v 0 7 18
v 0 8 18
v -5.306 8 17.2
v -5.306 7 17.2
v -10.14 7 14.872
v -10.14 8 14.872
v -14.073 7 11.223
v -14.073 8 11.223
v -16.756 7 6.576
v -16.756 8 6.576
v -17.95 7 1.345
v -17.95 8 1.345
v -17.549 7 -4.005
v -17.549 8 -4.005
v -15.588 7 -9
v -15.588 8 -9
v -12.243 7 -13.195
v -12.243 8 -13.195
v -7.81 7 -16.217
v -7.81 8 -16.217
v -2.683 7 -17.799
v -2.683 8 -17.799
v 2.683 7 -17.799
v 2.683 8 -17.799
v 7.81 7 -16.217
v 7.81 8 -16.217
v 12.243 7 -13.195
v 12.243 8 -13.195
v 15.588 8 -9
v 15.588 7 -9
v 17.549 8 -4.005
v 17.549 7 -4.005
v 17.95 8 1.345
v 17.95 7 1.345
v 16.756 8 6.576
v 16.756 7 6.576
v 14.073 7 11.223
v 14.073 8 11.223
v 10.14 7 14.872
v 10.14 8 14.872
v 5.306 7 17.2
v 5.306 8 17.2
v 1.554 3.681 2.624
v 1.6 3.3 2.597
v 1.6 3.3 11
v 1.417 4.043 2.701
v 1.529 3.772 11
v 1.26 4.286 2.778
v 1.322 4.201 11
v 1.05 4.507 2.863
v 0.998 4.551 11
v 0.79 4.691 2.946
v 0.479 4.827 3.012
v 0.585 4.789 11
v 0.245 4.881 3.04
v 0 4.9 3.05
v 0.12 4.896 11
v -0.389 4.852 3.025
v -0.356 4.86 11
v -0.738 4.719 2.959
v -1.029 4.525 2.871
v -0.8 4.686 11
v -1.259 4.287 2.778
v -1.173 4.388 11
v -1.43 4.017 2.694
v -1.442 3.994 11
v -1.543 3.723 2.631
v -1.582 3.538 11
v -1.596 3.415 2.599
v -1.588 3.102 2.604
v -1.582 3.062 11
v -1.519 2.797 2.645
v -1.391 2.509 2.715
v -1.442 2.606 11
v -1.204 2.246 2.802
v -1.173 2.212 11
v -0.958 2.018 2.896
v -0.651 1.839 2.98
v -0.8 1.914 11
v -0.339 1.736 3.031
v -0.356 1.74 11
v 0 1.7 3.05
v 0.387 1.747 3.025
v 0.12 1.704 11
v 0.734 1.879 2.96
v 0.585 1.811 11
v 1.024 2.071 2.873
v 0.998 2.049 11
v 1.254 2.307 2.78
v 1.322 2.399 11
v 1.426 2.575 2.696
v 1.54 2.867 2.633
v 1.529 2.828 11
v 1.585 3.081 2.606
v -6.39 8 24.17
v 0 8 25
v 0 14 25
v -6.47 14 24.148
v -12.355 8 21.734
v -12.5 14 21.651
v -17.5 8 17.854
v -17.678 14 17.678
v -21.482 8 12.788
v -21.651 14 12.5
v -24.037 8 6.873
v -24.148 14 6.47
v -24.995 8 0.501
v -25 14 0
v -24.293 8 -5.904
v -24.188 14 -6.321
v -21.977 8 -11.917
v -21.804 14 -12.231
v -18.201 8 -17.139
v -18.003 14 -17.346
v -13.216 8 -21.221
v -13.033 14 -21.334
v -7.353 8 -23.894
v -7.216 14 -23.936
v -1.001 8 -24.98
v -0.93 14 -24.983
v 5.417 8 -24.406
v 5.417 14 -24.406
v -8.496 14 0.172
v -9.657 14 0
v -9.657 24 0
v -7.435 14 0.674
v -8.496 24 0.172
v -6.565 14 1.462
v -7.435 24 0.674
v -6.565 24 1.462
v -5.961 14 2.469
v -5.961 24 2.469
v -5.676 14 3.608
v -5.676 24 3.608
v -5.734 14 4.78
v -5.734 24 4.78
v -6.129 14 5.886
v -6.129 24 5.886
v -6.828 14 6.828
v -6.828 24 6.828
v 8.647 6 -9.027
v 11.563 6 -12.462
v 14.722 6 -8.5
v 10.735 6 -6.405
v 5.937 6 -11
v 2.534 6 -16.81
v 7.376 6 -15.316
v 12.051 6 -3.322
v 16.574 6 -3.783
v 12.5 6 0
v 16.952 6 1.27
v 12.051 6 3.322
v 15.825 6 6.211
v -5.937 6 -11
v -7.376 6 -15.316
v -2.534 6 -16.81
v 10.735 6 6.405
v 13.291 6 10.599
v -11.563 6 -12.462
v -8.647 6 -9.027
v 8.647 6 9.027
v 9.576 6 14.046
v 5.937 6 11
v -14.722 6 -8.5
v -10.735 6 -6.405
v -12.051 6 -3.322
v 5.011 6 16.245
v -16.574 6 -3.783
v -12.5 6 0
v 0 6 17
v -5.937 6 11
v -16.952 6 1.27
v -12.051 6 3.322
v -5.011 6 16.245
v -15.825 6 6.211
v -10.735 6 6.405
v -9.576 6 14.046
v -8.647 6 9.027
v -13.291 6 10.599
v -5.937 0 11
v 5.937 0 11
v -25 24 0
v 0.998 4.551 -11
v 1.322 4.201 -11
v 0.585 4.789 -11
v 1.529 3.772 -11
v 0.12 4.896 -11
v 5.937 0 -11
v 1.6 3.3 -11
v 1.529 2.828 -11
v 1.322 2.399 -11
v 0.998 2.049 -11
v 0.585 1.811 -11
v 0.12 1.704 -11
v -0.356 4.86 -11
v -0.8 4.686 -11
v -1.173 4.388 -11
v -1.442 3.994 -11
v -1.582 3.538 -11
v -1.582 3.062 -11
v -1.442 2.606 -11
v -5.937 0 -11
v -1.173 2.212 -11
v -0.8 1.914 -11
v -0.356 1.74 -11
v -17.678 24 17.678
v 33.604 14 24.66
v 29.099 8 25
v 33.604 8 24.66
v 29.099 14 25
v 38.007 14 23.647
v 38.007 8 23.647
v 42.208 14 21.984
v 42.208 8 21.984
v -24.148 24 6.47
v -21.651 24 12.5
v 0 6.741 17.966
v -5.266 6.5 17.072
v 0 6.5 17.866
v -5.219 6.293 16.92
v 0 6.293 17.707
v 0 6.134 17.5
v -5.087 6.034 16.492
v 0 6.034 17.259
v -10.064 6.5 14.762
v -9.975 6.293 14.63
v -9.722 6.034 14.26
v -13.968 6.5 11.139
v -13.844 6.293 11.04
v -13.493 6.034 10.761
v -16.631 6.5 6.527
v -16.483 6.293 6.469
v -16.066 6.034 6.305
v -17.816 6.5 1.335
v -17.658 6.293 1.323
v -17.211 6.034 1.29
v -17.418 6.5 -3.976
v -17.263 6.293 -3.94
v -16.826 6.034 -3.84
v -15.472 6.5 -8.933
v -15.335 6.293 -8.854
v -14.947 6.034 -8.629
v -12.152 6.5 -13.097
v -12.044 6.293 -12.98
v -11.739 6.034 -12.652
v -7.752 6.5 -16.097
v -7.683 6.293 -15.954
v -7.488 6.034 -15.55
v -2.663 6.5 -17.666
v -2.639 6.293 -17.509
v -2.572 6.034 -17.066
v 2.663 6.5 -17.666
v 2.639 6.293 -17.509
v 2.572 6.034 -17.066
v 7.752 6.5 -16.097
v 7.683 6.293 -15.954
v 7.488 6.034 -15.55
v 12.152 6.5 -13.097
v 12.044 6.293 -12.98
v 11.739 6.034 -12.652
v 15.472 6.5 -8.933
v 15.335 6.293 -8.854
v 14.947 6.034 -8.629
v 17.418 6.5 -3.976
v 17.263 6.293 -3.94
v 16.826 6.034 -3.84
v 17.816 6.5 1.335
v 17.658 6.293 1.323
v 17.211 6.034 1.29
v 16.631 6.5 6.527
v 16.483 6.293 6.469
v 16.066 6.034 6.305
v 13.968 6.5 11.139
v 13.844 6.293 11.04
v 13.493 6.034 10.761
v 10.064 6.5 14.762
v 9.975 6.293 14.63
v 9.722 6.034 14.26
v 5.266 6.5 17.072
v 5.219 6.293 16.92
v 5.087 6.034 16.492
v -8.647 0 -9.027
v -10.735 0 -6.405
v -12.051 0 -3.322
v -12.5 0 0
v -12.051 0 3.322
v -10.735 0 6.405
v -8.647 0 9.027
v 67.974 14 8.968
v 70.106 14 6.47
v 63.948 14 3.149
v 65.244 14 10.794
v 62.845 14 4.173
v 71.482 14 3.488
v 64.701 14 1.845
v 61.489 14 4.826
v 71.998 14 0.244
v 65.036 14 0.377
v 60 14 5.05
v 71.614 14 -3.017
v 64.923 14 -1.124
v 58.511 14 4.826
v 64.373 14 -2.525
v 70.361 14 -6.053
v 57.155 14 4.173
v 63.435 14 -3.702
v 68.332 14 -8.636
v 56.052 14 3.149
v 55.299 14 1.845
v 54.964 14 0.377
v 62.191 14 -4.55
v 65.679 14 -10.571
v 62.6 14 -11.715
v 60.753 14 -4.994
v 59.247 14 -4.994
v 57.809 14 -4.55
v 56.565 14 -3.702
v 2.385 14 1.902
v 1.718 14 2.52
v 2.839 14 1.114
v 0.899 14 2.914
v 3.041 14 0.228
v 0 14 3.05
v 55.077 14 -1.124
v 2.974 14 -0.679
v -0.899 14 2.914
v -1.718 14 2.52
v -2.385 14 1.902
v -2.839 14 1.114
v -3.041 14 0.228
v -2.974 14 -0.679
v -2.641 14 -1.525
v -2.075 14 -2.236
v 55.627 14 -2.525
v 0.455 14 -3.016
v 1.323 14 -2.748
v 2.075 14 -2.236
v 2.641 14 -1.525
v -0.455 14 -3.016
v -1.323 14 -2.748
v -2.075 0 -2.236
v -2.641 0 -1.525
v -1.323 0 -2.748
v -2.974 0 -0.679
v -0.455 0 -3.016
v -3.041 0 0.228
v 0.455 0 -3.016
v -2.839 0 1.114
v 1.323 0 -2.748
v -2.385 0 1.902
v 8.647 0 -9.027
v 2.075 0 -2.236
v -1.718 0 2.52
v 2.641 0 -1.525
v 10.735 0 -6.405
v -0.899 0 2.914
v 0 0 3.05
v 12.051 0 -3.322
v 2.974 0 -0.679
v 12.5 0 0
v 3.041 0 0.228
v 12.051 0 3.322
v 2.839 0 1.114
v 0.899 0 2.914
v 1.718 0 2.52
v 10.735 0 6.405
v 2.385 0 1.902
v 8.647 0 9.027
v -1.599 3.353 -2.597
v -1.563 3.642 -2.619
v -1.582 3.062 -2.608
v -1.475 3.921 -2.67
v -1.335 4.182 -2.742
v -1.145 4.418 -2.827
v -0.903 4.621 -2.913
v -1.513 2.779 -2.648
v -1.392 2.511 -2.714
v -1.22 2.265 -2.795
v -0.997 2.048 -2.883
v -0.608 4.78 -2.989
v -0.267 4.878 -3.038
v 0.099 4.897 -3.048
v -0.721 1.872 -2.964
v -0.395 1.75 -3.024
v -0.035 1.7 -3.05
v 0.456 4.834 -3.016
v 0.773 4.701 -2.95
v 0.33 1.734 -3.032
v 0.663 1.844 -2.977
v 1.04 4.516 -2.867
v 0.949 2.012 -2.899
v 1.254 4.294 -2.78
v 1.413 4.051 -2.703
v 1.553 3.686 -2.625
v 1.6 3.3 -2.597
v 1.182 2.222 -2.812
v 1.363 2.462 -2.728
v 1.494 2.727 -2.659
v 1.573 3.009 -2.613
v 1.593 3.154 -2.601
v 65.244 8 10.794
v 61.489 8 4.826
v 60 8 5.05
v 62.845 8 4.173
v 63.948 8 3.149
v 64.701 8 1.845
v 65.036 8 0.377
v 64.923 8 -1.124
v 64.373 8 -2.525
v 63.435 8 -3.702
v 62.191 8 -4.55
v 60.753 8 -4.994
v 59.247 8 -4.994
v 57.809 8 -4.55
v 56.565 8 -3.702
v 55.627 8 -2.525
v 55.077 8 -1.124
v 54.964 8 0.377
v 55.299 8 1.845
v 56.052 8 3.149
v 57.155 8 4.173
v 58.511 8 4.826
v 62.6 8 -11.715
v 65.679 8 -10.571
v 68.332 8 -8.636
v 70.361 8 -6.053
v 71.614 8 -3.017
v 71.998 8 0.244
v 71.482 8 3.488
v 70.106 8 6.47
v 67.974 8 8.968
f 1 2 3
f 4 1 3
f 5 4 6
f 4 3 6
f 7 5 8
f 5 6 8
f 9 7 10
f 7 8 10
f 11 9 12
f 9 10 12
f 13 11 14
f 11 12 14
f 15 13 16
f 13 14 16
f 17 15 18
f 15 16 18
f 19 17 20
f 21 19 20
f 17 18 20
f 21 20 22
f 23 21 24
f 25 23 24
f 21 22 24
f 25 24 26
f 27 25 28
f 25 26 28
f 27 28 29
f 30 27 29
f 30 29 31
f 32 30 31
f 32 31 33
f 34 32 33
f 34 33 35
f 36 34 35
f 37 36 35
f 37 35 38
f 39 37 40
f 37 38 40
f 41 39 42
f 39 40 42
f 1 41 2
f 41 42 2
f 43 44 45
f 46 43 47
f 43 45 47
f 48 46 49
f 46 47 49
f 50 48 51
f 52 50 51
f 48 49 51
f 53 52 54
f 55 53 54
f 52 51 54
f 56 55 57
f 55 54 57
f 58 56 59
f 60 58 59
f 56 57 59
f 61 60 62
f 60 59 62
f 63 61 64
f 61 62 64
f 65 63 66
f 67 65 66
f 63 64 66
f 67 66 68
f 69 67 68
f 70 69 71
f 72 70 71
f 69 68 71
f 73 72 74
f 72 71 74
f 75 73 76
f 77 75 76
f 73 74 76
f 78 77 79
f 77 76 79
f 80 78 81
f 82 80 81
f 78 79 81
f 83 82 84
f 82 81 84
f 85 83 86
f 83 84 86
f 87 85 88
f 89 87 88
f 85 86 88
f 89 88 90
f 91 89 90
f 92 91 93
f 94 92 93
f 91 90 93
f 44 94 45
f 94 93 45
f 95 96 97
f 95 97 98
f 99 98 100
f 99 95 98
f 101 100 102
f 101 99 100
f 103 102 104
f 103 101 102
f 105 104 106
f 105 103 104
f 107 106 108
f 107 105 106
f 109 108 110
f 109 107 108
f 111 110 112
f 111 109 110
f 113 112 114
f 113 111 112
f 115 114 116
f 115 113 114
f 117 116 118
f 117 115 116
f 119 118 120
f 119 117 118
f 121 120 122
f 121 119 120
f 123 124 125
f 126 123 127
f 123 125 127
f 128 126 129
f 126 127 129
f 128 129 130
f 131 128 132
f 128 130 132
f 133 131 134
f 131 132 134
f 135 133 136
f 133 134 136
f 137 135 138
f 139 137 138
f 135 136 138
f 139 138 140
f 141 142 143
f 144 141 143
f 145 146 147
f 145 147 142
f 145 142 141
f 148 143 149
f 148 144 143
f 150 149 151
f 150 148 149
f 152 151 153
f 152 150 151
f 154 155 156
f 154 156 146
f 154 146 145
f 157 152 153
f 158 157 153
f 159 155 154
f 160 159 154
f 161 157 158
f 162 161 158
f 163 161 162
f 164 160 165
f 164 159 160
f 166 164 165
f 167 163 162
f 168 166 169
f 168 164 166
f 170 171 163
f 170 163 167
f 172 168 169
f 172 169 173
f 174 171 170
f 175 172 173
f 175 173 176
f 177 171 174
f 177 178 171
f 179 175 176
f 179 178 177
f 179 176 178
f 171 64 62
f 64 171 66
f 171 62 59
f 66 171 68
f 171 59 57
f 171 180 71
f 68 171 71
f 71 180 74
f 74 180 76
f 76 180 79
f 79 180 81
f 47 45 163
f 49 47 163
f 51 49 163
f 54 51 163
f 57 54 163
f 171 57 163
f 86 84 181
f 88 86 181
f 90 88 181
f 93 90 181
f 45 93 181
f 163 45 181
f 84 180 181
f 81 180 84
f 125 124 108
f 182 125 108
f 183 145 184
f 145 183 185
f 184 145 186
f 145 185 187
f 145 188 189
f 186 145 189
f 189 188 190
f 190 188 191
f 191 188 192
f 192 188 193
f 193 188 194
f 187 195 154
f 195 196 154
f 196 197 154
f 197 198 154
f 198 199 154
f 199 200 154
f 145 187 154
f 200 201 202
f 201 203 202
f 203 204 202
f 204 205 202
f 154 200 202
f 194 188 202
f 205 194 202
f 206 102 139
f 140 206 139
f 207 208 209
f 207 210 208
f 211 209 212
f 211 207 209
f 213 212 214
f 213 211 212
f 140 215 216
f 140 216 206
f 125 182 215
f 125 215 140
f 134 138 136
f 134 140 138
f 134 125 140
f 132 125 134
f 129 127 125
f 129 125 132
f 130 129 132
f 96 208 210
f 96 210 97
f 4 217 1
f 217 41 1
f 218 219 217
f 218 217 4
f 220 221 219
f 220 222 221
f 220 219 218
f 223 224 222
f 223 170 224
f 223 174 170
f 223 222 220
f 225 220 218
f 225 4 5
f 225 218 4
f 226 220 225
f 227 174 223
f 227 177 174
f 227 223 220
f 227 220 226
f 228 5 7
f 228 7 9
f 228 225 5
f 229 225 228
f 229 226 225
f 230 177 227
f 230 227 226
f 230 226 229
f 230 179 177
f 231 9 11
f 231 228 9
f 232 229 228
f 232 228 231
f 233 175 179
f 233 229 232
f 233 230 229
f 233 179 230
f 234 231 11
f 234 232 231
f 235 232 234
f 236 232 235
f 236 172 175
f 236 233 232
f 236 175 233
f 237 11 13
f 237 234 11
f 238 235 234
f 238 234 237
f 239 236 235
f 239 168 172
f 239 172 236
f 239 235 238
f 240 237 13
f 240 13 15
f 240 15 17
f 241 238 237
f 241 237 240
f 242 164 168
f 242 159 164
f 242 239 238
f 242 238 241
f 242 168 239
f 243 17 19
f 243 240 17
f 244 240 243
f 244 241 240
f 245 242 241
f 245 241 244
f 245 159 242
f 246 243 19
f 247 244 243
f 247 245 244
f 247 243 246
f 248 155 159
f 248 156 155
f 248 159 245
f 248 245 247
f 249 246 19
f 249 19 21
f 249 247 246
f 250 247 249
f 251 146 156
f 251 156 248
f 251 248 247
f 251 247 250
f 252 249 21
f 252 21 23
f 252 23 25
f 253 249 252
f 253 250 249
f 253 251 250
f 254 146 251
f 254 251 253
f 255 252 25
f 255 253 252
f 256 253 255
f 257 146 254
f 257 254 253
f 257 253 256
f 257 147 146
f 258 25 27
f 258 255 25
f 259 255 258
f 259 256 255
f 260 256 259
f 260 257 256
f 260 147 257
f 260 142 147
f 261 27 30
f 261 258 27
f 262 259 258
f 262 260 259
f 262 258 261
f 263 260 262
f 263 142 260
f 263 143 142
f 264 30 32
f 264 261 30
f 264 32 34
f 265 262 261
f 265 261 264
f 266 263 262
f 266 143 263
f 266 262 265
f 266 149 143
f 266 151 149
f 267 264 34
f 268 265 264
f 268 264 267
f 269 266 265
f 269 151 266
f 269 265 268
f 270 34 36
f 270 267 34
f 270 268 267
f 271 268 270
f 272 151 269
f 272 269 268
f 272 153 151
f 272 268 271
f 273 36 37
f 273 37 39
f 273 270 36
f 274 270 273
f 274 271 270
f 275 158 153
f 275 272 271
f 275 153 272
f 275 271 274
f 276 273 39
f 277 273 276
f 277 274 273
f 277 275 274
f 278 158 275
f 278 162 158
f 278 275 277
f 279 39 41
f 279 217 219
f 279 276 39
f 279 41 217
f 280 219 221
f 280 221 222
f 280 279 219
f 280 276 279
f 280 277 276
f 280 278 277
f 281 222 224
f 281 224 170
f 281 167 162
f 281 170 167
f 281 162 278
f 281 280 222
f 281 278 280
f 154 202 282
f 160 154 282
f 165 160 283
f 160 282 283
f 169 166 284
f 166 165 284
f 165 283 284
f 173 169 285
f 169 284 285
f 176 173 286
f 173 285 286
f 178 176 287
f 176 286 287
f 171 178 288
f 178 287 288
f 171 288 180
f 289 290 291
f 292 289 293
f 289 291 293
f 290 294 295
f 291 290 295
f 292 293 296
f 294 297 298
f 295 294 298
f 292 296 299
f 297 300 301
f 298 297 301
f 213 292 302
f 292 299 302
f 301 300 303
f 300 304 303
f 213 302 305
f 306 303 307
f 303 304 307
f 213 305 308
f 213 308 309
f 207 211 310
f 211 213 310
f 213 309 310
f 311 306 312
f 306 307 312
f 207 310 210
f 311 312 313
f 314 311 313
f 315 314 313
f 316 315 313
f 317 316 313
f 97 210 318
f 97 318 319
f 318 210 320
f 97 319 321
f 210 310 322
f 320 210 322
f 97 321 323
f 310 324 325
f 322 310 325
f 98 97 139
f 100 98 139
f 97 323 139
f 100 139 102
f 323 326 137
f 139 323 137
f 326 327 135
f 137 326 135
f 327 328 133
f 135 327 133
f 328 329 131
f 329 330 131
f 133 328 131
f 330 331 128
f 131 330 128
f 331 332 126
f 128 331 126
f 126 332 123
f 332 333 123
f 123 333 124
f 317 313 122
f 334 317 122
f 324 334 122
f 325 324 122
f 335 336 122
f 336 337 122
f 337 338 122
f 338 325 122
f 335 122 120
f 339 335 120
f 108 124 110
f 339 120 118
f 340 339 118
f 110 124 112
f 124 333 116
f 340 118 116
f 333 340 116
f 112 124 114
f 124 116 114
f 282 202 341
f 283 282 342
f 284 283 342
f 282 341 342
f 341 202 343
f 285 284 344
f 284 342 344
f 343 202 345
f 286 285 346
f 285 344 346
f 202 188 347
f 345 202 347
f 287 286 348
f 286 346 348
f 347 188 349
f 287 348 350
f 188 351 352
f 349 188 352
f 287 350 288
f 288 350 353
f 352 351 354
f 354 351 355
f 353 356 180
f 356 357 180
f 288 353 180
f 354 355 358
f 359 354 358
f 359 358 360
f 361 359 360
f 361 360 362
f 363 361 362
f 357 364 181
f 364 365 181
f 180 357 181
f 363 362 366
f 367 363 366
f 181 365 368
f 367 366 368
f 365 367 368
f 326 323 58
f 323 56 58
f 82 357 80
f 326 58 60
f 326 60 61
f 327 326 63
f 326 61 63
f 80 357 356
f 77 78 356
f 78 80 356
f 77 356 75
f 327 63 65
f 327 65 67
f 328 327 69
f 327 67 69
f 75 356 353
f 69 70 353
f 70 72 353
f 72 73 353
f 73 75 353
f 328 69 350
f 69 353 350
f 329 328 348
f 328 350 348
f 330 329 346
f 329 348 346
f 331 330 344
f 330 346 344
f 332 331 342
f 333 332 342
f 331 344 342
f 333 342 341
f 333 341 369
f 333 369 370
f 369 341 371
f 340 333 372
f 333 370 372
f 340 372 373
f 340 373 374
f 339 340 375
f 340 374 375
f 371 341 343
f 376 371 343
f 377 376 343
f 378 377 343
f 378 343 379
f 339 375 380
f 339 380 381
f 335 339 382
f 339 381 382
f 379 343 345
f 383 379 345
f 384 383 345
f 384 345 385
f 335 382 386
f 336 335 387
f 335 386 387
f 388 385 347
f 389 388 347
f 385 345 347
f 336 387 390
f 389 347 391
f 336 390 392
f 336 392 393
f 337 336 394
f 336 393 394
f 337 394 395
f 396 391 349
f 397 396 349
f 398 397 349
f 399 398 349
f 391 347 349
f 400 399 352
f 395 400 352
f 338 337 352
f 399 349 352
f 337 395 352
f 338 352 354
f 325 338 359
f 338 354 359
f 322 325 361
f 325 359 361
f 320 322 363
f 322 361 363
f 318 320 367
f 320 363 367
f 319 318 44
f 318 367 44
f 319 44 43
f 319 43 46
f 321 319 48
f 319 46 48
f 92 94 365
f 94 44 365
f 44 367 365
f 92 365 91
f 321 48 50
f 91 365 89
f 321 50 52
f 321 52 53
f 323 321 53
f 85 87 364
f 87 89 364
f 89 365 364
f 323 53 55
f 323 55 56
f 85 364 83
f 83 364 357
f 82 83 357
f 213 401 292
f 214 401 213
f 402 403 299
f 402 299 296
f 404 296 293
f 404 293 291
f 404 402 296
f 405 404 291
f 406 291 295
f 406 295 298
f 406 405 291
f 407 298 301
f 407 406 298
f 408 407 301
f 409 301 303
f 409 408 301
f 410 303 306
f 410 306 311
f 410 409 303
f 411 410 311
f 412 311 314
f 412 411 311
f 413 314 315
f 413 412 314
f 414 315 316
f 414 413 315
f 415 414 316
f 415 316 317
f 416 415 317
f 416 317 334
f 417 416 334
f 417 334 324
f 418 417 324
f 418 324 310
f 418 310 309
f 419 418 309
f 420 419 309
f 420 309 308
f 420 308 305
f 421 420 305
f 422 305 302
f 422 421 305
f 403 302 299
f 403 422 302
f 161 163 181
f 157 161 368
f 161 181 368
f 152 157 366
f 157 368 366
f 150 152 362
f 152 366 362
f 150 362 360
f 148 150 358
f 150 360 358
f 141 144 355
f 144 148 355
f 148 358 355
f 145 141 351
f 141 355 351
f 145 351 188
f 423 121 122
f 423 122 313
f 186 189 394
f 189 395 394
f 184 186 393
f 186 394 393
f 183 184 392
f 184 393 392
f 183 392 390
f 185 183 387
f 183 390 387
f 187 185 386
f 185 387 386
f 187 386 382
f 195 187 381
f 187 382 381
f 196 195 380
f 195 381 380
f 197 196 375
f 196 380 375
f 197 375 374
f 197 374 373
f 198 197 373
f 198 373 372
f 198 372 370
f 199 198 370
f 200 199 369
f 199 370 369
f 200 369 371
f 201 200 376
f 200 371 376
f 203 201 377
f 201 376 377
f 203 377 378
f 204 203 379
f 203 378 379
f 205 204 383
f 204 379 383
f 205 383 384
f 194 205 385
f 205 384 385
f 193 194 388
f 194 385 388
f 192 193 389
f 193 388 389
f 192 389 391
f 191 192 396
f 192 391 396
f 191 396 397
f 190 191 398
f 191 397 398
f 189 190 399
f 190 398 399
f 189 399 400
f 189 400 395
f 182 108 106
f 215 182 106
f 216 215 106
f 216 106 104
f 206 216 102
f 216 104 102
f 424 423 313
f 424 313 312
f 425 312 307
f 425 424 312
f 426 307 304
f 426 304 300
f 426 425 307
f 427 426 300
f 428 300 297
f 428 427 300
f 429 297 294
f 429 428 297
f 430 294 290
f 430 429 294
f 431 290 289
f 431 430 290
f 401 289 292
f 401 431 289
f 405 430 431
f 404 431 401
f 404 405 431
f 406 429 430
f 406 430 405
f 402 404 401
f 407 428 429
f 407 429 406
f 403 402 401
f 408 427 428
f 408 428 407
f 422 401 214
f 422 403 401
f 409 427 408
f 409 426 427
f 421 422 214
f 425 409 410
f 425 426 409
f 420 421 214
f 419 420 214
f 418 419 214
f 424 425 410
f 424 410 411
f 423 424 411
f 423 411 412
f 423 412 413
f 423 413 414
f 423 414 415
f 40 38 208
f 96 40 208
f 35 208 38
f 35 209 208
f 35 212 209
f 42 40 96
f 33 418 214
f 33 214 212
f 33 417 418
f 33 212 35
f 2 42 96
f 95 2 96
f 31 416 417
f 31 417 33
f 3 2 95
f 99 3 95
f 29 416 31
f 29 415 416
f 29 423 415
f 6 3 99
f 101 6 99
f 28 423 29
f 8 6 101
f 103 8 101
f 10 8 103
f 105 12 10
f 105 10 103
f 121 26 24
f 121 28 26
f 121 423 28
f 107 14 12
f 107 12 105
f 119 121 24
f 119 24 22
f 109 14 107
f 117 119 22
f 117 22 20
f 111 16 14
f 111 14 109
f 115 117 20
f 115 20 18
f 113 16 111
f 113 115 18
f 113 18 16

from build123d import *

# Parameters (mm, degrees)
SKETCH_1_R          = 12.5
SKETCH_1_R_2        = 3.05
EXTRUDE_1_DEPTH     = 8
SKETCH_2_R          = 1.6
CUT_EXTRUDE_4_DEPTH = 12.5
SKETCH_3_R          = 5.05
EXTRUDE_2_DEPTH     = 6
SKETCH_4_R          = 18
EXTRUDE_3_DEPTH     = 2
FILLET_2_R          = 30
FILLET_1_R          = 1
EXTRUDE_4_DEPTH     = 10
FILLET_3_R          = 4
SKETCH_6_R          = 3.05
CUT_EXTRUDE_5_DEPTH = 14
CUT_EXTRUDE_6_REACH = 81.906


with BuildPart() as part:
    # 草图1 → 凸台-拉伸1 (new body)
    with BuildSketch(Plane(origin=(0, 0, 0), x_dir=(1, 0, 0), z_dir=(0, 1, 0))):
        with Locations(Location((0, 0, 0), (0, 0, 270))):
            Circle(SKETCH_1_R)
        with Locations(Location((0, 0, 0), (0, 0, 270))):
            Circle(SKETCH_1_R_2, mode=Mode.SUBTRACT)
    extrude(amount=EXTRUDE_1_DEPTH)

    # 草图2 → 切除-拉伸4 (cut, symmetric)
    with BuildSketch(Plane.XY):
        with Locations((0, 3.3)):
            Circle(SKETCH_2_R)
    extrude(amount=CUT_EXTRUDE_4_DEPTH, both=True, mode=Mode.SUBTRACT)

    # 草图3 → 凸台-拉伸2 (add)
    with BuildSketch(Plane(origin=(0, 8, 0), x_dir=(1, 0, 0), z_dir=(0, 1, 0))):
        with BuildLine():
            Line((5.416666667, 24.406141076), (62.6, 11.714947716))
            ThreePointArc((62.6, 11.714947716), (71.918087828, 1.399708015), (65.243514508, -10.793773928))
            Line((65.243514508, -10.793773928), (36, -25))
            Line((36, -25), (0, -25))
            ThreePointArc((0, -25), (-24.851091796, 2.724561717), (5.416666667, 24.406141076))
        make_face()
        with Locations(Location((60, 0, 0), (0, 0, 270))):
            Circle(SKETCH_3_R, mode=Mode.SUBTRACT)
    extrude(amount=EXTRUDE_2_DEPTH)

    # 草图4 → 凸台-拉伸3 (add)
    with BuildSketch(Plane.XZ.offset(-8)):
        with Locations(Location((0, 0, 0), (0, 0, 90))):
            Circle(SKETCH_4_R)
    extrude(amount=EXTRUDE_3_DEPTH)

    # 圆角2
    fillet_2_edges = [part.edges().sort_by_distance(p)[0] for p in [
        (36, 11, 25),
    ]]
    fillet(fillet_2_edges, radius=FILLET_2_R)

    # 圆角1
    fillet_1_edges = [part.edges().sort_by_distance(p)[0] for p in [
        (0, 6, -18),
    ]]
    fillet(fillet_1_edges, radius=FILLET_1_R)

    # 草图5 → 凸台-拉伸4 (add)
    with BuildSketch(Plane(origin=(0, 14, 0), x_dir=(1, 0, 0), z_dir=(0, 1, 0))):
        with BuildLine():
            Line((0, 0), (-25, 0))
            ThreePointArc((-25, 0), (-23.096988313, -9.567085809), (-17.67766953, -17.67766953))
            Line((-17.67766953, -17.67766953), (0, 0))
        make_face()
    extrude(amount=EXTRUDE_4_DEPTH)

    # 圆角3
    fillet_3_edges = [part.edges().sort_by_distance(p)[0] for p in [
        (0, 19, 0),
    ]]
    fillet(fillet_3_edges, radius=FILLET_3_R)

    # 草图6 → 切除-拉伸5 (cut)
    with BuildSketch(Plane.XZ):
        with Locations(Location((0, 0, 0), (0, 0, 90))):
            Circle(SKETCH_6_R)
    extrude(amount=-CUT_EXTRUDE_5_DEPTH, mode=Mode.SUBTRACT)

    # 切除-拉伸6: up to this face of the body (flat: up to its plane)
    cut_extrude_6_end = Plane(part.part.faces().sort_by_distance((0, 6, -16.519167389))[0])
    # 草图8 → 切除-拉伸6 (cut, up to the picked face)
    with BuildSketch(Plane.XZ, mode=Mode.PRIVATE) as cut_extrude_6_sk1:
        with BuildLine():
            ThreePointArc((5.937171044, 11), (0, 12.5), (-5.937171044, 11))
            Line((-5.937171044, 11), (5.937171044, 11))
        make_face()
    cut_extrude_6_tool1 = split(extrude(cut_extrude_6_sk1.sketch, amount=-CUT_EXTRUDE_6_REACH, mode=Mode.PRIVATE), bisect_by=cut_extrude_6_end, keep=Keep.BOTH, mode=Mode.PRIVATE)
    # 草图8 → 切除-拉伸6 (cut, up to the picked face)
    with BuildSketch(Plane.XZ, mode=Mode.PRIVATE) as cut_extrude_6_sk2:
        with BuildLine():
            Line((5.937171044, -11), (-5.937171044, -11))
            ThreePointArc((-5.937171044, -11), (0, -12.5), (5.937171044, -11))
        make_face()
    cut_extrude_6_tool2 = split(extrude(cut_extrude_6_sk2.sketch, amount=-CUT_EXTRUDE_6_REACH, mode=Mode.PRIVATE), bisect_by=cut_extrude_6_end, keep=Keep.BOTH, mode=Mode.PRIVATE)
    add(cut_extrude_6_tool1.solids().sort_by(Axis((0, 0, 11.603197), (0, 1, 0)))[0], mode=Mode.SUBTRACT)
    add(cut_extrude_6_tool2.solids().sort_by(Axis((0, 0, -11.603197), (0, 1, 0)))[0], mode=Mode.SUBTRACT)


solid = part.part
